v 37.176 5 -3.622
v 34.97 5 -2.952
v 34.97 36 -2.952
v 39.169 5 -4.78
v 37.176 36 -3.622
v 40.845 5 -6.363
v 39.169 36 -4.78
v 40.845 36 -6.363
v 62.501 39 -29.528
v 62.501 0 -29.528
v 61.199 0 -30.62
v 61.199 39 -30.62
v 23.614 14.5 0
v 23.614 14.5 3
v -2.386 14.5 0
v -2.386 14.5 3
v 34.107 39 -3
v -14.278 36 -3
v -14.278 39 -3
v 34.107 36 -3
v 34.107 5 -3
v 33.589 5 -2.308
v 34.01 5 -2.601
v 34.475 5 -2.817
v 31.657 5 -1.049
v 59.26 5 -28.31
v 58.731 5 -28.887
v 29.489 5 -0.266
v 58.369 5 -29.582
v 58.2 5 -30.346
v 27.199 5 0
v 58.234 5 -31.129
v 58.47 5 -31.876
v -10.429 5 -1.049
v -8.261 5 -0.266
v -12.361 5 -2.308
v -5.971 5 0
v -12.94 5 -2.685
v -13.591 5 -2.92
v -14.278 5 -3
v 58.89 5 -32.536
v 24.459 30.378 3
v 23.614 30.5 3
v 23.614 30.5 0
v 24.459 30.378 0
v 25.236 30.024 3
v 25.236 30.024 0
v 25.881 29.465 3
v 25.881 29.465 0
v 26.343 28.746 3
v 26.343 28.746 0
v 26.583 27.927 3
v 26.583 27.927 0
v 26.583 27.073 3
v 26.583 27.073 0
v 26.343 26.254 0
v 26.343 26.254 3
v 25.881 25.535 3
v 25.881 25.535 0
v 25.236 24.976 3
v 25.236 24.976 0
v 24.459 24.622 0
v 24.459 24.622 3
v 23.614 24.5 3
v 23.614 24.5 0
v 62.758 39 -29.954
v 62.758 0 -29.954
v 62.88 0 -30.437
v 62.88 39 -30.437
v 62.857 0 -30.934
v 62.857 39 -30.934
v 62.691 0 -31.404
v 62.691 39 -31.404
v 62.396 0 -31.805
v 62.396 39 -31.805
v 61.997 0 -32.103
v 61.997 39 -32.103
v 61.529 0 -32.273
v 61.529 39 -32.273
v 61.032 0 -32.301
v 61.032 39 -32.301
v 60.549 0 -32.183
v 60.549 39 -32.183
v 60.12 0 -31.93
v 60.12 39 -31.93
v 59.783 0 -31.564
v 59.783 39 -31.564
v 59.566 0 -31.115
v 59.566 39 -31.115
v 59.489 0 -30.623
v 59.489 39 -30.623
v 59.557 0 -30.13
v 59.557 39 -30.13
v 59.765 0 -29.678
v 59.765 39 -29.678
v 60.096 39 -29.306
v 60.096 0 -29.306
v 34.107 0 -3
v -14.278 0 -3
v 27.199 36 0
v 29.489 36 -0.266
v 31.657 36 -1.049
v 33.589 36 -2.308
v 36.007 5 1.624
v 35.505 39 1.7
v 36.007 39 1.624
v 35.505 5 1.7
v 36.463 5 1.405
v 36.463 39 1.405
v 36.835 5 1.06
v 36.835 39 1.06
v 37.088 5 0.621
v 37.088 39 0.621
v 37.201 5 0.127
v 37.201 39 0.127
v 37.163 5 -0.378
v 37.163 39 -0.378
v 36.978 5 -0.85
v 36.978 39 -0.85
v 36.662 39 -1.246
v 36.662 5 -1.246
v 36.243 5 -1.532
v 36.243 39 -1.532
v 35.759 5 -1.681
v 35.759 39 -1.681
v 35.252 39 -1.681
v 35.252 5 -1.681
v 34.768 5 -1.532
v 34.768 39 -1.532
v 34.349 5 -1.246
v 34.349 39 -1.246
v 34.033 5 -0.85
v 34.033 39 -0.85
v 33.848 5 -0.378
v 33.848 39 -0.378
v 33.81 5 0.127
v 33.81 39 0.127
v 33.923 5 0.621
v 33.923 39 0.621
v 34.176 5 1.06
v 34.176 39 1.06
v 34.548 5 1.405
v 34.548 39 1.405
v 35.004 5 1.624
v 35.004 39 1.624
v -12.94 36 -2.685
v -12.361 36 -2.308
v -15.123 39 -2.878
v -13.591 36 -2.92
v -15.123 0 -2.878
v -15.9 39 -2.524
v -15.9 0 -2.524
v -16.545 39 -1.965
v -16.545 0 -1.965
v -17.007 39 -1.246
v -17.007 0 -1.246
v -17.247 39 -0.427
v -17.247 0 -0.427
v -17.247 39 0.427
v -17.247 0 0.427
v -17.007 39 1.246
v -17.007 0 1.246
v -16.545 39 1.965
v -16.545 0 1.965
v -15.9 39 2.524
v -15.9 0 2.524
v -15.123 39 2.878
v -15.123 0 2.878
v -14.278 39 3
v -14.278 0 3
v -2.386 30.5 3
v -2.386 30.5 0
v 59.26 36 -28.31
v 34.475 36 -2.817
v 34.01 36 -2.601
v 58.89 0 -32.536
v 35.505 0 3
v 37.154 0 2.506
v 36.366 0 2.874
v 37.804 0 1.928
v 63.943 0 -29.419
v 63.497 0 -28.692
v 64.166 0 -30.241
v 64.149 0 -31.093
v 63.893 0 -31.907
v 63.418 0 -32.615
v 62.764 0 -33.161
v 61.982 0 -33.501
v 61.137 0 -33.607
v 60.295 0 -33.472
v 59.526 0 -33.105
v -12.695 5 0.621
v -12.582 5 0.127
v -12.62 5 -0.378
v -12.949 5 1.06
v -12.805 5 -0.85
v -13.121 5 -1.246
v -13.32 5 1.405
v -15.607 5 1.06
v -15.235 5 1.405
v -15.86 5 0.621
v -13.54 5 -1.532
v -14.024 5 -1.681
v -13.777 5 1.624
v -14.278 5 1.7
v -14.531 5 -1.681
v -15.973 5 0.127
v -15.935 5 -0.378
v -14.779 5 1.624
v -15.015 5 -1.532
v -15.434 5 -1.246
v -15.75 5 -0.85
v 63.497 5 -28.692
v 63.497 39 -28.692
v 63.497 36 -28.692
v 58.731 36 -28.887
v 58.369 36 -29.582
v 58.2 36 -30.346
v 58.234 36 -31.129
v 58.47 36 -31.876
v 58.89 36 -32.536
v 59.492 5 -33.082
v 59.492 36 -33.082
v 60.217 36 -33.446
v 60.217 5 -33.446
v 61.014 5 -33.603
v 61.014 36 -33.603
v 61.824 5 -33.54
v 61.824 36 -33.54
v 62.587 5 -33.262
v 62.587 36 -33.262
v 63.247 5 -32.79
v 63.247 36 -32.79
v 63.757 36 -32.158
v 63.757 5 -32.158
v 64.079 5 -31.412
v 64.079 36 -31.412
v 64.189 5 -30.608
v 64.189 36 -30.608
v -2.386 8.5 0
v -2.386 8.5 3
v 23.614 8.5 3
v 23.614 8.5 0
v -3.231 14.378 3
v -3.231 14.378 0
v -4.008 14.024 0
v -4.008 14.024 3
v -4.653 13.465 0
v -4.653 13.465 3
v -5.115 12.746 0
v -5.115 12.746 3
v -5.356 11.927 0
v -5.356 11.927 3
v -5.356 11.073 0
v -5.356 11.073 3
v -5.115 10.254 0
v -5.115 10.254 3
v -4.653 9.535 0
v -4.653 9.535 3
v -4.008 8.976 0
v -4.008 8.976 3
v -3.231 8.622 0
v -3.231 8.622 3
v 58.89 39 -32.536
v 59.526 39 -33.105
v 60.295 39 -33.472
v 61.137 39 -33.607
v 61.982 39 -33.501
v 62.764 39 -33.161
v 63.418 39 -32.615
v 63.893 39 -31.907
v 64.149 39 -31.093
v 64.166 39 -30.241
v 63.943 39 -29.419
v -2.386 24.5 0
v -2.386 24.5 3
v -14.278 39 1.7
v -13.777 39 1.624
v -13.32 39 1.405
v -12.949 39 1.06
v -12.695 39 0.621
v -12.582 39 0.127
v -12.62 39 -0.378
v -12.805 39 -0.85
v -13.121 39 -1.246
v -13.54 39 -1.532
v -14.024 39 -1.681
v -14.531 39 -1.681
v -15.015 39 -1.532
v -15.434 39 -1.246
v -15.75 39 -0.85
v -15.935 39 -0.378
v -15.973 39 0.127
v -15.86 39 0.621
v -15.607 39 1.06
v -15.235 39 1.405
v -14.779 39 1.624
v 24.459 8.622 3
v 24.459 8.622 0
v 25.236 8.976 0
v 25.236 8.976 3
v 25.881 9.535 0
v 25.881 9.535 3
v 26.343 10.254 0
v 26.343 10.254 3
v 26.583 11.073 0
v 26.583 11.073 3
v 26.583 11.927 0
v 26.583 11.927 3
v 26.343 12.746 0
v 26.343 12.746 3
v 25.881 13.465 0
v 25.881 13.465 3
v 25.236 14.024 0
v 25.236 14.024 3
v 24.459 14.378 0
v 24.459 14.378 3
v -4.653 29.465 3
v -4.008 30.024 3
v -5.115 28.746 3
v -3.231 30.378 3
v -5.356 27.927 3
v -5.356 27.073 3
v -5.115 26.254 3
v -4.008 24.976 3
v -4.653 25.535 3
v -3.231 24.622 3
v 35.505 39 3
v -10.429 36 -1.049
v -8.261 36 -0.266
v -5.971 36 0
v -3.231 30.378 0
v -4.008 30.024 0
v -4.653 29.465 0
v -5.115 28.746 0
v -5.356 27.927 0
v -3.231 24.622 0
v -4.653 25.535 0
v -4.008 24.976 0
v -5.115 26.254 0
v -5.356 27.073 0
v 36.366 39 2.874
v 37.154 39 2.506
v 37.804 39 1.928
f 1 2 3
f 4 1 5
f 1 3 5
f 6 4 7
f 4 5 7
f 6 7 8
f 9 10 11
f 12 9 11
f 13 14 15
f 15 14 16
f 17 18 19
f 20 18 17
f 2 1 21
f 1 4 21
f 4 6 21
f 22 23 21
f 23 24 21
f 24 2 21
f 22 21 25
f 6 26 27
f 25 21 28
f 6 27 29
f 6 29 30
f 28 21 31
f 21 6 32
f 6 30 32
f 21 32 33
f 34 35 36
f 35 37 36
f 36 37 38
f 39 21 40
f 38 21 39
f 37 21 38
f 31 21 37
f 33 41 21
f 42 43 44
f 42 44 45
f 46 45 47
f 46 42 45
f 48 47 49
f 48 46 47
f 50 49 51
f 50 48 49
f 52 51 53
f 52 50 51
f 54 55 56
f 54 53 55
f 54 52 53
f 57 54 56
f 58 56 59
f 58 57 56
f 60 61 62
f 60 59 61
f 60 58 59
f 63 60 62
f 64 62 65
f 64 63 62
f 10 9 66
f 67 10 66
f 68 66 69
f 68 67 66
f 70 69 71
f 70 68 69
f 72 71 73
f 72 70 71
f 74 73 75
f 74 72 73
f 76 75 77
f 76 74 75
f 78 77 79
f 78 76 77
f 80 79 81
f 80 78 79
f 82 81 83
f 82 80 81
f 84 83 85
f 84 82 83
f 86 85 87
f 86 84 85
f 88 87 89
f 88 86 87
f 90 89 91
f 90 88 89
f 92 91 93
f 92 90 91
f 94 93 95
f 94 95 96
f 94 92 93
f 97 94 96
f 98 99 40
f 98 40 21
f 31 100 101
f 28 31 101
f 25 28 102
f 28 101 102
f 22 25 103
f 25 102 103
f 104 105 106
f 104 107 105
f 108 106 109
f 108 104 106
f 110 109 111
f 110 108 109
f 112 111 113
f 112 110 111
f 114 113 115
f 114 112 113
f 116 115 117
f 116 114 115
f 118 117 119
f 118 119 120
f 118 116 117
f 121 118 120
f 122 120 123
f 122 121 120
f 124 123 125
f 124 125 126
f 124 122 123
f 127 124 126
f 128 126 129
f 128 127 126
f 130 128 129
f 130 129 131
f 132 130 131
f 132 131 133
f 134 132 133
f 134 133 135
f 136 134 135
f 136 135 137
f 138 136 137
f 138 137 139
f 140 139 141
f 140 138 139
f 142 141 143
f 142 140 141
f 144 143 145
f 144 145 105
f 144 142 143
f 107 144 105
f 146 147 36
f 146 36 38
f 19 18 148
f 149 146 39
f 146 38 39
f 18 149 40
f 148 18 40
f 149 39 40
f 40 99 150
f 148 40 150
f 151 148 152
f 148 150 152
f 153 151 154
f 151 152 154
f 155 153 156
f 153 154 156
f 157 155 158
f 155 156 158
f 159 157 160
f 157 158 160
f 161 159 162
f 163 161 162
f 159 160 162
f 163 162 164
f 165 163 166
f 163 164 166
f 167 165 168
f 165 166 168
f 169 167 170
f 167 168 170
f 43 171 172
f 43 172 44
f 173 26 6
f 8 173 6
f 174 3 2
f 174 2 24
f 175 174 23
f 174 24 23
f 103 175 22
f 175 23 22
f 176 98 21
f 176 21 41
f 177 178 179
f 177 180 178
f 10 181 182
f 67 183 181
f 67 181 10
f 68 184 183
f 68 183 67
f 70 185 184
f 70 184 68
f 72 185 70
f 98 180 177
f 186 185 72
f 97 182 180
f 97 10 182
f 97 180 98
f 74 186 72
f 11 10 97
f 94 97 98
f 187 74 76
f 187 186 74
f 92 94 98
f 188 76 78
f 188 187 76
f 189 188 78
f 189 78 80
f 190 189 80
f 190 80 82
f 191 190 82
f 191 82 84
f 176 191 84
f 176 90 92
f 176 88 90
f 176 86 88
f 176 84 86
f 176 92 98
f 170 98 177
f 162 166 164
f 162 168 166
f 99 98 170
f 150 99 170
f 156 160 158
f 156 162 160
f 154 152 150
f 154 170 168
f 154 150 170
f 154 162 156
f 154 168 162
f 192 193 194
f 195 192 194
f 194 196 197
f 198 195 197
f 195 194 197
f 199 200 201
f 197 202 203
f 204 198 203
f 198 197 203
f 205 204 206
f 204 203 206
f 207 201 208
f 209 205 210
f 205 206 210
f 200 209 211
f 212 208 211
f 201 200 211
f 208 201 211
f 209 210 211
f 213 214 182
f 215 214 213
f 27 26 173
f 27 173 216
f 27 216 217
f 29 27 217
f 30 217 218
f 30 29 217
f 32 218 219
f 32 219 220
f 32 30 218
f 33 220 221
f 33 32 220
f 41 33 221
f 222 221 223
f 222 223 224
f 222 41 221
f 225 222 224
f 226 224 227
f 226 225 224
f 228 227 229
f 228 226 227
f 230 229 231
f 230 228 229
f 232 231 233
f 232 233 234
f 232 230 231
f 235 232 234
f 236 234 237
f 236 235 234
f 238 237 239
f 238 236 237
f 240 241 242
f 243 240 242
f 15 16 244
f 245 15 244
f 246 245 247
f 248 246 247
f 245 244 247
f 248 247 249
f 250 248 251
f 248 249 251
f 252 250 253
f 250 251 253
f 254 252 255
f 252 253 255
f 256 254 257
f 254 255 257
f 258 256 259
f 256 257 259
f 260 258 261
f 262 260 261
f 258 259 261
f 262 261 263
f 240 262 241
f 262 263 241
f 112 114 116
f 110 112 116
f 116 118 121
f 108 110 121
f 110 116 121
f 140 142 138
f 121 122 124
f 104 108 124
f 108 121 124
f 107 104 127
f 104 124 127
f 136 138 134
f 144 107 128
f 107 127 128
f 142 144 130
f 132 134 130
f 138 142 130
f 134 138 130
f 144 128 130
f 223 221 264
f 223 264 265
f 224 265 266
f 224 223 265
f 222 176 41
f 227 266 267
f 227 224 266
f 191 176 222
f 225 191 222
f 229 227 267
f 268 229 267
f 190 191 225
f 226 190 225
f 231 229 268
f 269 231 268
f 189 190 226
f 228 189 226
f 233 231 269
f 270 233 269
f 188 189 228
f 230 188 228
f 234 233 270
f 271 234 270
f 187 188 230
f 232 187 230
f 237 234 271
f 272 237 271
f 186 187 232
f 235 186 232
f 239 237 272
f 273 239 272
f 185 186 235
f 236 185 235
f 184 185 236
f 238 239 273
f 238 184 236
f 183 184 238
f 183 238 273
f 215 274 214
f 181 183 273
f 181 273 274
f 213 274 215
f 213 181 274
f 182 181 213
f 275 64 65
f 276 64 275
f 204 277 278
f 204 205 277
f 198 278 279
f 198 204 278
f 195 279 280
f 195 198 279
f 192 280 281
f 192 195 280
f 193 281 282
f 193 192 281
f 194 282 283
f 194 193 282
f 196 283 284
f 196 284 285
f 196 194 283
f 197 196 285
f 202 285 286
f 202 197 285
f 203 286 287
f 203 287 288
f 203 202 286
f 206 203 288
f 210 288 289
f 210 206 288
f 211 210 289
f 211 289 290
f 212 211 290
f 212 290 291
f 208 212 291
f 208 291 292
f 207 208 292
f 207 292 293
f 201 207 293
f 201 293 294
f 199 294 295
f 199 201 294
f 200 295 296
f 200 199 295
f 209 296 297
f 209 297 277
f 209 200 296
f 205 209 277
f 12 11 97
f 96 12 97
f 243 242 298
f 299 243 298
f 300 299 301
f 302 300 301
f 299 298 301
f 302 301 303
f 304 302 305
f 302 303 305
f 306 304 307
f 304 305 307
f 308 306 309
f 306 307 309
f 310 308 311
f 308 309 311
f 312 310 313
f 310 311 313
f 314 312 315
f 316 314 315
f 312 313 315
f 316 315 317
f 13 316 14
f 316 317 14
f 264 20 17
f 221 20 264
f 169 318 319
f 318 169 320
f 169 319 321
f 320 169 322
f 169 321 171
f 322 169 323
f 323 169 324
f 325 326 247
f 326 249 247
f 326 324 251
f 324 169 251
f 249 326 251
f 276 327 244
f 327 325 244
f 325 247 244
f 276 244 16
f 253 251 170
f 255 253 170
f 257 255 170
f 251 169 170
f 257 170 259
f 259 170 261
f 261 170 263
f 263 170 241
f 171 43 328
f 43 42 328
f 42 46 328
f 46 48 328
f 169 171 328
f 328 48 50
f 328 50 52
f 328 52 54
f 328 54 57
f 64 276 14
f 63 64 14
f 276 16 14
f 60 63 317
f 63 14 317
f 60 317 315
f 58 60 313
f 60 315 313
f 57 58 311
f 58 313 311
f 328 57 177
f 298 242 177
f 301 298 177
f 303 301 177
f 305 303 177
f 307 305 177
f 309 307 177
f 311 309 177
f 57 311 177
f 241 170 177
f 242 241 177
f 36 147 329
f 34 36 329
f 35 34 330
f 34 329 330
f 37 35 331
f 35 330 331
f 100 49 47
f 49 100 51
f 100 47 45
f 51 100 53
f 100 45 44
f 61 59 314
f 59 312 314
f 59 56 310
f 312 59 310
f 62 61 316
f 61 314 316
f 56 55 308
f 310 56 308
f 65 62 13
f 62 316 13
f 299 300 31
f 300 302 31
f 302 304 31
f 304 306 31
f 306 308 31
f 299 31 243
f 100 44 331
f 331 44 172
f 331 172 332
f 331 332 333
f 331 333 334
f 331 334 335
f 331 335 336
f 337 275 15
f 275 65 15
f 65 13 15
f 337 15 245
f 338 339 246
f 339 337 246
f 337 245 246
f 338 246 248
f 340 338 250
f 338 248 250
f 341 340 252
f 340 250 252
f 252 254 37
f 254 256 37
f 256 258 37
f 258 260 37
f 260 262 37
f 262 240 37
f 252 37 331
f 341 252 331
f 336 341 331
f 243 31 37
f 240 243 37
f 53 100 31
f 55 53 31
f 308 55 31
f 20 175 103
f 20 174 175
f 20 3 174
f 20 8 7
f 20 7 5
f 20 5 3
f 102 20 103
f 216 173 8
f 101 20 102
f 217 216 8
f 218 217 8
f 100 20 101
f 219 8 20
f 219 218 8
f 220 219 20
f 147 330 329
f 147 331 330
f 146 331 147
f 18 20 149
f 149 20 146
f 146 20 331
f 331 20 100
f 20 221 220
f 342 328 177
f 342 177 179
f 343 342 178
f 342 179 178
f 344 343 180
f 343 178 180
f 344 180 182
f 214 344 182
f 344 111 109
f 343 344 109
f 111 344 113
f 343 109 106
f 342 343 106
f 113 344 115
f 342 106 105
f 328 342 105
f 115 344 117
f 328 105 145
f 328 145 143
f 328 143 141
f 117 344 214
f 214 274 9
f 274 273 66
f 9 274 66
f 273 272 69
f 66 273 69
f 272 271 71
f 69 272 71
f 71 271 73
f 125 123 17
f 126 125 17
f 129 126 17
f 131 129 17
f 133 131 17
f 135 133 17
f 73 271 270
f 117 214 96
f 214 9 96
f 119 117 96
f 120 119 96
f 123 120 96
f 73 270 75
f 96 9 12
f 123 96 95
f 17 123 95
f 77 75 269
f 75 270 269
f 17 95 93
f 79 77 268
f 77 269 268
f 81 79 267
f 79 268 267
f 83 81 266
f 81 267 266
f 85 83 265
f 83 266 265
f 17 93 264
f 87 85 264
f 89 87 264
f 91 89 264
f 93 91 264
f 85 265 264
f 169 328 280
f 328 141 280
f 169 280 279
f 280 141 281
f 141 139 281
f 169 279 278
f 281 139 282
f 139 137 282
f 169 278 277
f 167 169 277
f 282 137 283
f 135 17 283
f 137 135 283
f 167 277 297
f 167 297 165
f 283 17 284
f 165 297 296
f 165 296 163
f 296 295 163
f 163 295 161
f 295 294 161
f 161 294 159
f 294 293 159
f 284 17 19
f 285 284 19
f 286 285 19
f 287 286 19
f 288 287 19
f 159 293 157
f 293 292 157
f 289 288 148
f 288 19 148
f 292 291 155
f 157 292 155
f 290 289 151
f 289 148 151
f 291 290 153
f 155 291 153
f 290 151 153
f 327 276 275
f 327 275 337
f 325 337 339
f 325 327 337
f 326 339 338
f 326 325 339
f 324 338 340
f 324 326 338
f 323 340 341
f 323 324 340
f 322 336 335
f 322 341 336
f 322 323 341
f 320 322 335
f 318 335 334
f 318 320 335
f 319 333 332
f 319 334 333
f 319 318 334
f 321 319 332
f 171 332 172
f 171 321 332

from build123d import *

# Parameters (mm, degrees)
SKETCH_1_R          = 1.7
EXTRUDE_1_DEPTH     = 39
FILLET_1_R          = 10
EXTRUDE_2_DEPTH     = 5
EXTRUDE_START       = -3
SKETCH_4_R          = 1.7
EXTRUDE_3_DEPTH     = 3
CUT_EXTRUDE_2_DEPTH = 5
SKETCH_6_R          = 1.7
EXTRUDE_4_DEPTH     = 3
SKETCH_7_R          = 1.7
EXTRUDE_5_DEPTH     = 5
SKETCH_8_R          = 3
SKETCH_8_R_2        = 1.7
EXTRUDE_6_DEPTH     = 39


with BuildPart() as part:
    # 草图1 → 凸台-拉伸1 (new body)
    with BuildSketch(Plane(origin=(0, 0, 0), x_dir=(1, 0, 0), z_dir=(0, 1, 0))):
        with BuildLine():
            Line((-14.277701198, -3), (35.505461262, -3))
            ThreePointArc((35.505461262, -3), (36.773316047, -2.718923361), (37.803594591, -1.928362829))
            Line((37.803594591, -1.928362829), (63.497014217, 28.691862316))
            Line((63.497014217, 28.691862316), (61.198880888, 30.620225145))
            Line((61.198880888, 30.620225145), (37.433824091, 2.298133329))
            ThreePointArc((37.433824091, 2.298133329), (34.237606477, 2.718923361), (32.505461262, 0))
            Line((32.505461262, 0), (-11.277701198, 0))
            ThreePointArc((-11.277701198, 0), (-16.399021541, 2.121320344), (-14.277701198, -3))
        make_face()
        with Locations(Location((-14.277701198, 0, 0), (0, 0, 270))):
            Circle(SKETCH_1_R, mode=Mode.SUBTRACT)
        with Locations(Location((35.505461262, 0, 0), (0, 0, 270))):
            Circle(SKETCH_1_R, mode=Mode.SUBTRACT)
    extrude(amount=EXTRUDE_1_DEPTH)

    # 圆角1
    fillet_1_edges = [part.edges().sort_by_distance(p)[0] for p in [
        (37.433824091, 19.5, -2.298133329),
        (-11.277701198, 19.5, 0),
        (32.505461262, 19.5, 0),
    ]]
    fillet(fillet_1_edges, radius=FILLET_1_R)

    # 草图3 → 凸台-拉伸2 (add)
    with BuildSketch(Plane(origin=(0, 0, 0), x_dir=(1, 0, 0), z_dir=(0, 1, 0))):
        with BuildLine():
            Line((-14.277701198, 3), (35.505461262, 3))
            ThreePointArc((35.505461262, 3), (38.505461262, 0), (35.505461262, -3))
            Line((35.505461262, -3), (-14.277701198, -3))
            ThreePointArc((-14.277701198, -3), (-17.277701198, 0), (-14.277701198, 3))
        make_face()
    extrude(amount=EXTRUDE_2_DEPTH)

    # 草图4 → 凸台-拉伸3 (add)
    with BuildSketch(Plane(origin=(0, 39, 0), x_dir=(1, 0, 0), z_dir=(0, 1, 0)).offset(EXTRUDE_START)):
        with BuildLine():
            Line((-14.277701198, 3), (35.505461262, 3))
            ThreePointArc((35.505461262, 3), (38.505461262, 0), (35.505461262, -3))
            Line((35.505461262, -3), (-14.277701198, -3))
            ThreePointArc((-14.277701198, -3), (-17.277701198, 0), (-14.277701198, 3))
        make_face()
        with Locations(Location((-14.277701198, 0, 0), (0, 0, 270))):
            Circle(SKETCH_4_R, mode=Mode.SUBTRACT)
        with Locations(Location((35.505461262, 0, 0), (0, 0, 270))):
            Circle(SKETCH_4_R, mode=Mode.SUBTRACT)
    extrude(amount=EXTRUDE_3_DEPTH)

    # 草图5 → 切除-拉伸2 (cut)
    with BuildSketch(Plane.XY.offset(3)):
        with BuildLine():
            Line((-2.386119968, 30.5), (23.613880032, 30.5))
            ThreePointArc((23.613880032, 30.5), (26.613880032, 27.5), (23.613880032, 24.5))
            Line((23.613880032, 24.5), (-2.386119968, 24.5))
            ThreePointArc((-2.386119968, 24.5), (-5.386119968, 27.5), (-2.386119968, 30.5))
        make_face()
        with BuildLine():
            Line((-2.386119968, 8.5), (23.613880032, 8.5))
            ThreePointArc((23.613880032, 8.5), (26.613880032, 11.5), (23.613880032, 14.5))
            Line((23.613880032, 14.5), (-2.386119968, 14.5))
            ThreePointArc((-2.386119968, 14.5), (-5.386119968, 11.5), (-2.386119968, 8.5))
        make_face()
    extrude(amount=-CUT_EXTRUDE_2_DEPTH, mode=Mode.SUBTRACT)

    # 草图6 → 凸台-拉伸4 (add)
    with BuildSketch(Plane(origin=(0, 39, 0), x_dir=(1, 0, 0), z_dir=(0, 1, 0)).offset(EXTRUDE_START)):
        with BuildLine():
            Line((33.207327933, 1.928362829), (58.890388489, 32.536242516))
            ThreePointArc((58.890388489, 32.536242516), (63.116884647, 32.906013016), (63.486655148, 28.679516858))
            Line((63.486655148, 28.679516858), (37.803594591, -1.928362829))
            ThreePointArc((37.803594591, -1.928362829), (33.577098433, -2.298133329), (33.207327933, 1.928362829))
        make_face()
        with Locations(Location((35.505461262, 0, 0), (0, 0, 270))):
            Circle(SKETCH_6_R, mode=Mode.SUBTRACT)
        with Locations((61.188521818, 30.607879687)):
            Circle(SKETCH_6_R, mode=Mode.SUBTRACT)
    extrude(amount=EXTRUDE_4_DEPTH)

    # 草图7 → 凸台-拉伸5 (add)
    with BuildSketch(Plane(origin=(0, 0, 0), x_dir=(1, 0, 0), z_dir=(0, 1, 0))):
        with BuildLine():
            Line((33.207327933, 1.928362829), (58.890388489, 32.536242516))
            ThreePointArc((58.890388489, 32.536242516), (63.116884647, 32.906013016), (63.486655148, 28.679516858))
            Line((63.486655148, 28.679516858), (37.803594591, -1.928362829))
            ThreePointArc((37.803594591, -1.928362829), (33.577098433, -2.298133329), (33.207327933, 1.928362829))
        make_face()
        with Locations(Location((35.505461262, 0, 0), (0, 0, 270))):
            Circle(SKETCH_7_R, mode=Mode.SUBTRACT)
        with Locations((61.188521818, 30.607879687)):
            Circle(SKETCH_7_R, mode=Mode.SUBTRACT)
    extrude(amount=EXTRUDE_5_DEPTH)

    # 草图8 → 凸台-拉伸6 (add)
    with BuildSketch(Plane(origin=(0, 0, 0), x_dir=(1, 0, 0), z_dir=(0, 1, 0))):
        with Locations((61.188521818, 30.607879687)):
            Circle(SKETCH_8_R)
        with Locations((61.188521818, 30.607879687)):
            Circle(SKETCH_8_R_2, mode=Mode.SUBTRACT)
    extrude(amount=EXTRUDE_6_DEPTH)


solid = part.part
